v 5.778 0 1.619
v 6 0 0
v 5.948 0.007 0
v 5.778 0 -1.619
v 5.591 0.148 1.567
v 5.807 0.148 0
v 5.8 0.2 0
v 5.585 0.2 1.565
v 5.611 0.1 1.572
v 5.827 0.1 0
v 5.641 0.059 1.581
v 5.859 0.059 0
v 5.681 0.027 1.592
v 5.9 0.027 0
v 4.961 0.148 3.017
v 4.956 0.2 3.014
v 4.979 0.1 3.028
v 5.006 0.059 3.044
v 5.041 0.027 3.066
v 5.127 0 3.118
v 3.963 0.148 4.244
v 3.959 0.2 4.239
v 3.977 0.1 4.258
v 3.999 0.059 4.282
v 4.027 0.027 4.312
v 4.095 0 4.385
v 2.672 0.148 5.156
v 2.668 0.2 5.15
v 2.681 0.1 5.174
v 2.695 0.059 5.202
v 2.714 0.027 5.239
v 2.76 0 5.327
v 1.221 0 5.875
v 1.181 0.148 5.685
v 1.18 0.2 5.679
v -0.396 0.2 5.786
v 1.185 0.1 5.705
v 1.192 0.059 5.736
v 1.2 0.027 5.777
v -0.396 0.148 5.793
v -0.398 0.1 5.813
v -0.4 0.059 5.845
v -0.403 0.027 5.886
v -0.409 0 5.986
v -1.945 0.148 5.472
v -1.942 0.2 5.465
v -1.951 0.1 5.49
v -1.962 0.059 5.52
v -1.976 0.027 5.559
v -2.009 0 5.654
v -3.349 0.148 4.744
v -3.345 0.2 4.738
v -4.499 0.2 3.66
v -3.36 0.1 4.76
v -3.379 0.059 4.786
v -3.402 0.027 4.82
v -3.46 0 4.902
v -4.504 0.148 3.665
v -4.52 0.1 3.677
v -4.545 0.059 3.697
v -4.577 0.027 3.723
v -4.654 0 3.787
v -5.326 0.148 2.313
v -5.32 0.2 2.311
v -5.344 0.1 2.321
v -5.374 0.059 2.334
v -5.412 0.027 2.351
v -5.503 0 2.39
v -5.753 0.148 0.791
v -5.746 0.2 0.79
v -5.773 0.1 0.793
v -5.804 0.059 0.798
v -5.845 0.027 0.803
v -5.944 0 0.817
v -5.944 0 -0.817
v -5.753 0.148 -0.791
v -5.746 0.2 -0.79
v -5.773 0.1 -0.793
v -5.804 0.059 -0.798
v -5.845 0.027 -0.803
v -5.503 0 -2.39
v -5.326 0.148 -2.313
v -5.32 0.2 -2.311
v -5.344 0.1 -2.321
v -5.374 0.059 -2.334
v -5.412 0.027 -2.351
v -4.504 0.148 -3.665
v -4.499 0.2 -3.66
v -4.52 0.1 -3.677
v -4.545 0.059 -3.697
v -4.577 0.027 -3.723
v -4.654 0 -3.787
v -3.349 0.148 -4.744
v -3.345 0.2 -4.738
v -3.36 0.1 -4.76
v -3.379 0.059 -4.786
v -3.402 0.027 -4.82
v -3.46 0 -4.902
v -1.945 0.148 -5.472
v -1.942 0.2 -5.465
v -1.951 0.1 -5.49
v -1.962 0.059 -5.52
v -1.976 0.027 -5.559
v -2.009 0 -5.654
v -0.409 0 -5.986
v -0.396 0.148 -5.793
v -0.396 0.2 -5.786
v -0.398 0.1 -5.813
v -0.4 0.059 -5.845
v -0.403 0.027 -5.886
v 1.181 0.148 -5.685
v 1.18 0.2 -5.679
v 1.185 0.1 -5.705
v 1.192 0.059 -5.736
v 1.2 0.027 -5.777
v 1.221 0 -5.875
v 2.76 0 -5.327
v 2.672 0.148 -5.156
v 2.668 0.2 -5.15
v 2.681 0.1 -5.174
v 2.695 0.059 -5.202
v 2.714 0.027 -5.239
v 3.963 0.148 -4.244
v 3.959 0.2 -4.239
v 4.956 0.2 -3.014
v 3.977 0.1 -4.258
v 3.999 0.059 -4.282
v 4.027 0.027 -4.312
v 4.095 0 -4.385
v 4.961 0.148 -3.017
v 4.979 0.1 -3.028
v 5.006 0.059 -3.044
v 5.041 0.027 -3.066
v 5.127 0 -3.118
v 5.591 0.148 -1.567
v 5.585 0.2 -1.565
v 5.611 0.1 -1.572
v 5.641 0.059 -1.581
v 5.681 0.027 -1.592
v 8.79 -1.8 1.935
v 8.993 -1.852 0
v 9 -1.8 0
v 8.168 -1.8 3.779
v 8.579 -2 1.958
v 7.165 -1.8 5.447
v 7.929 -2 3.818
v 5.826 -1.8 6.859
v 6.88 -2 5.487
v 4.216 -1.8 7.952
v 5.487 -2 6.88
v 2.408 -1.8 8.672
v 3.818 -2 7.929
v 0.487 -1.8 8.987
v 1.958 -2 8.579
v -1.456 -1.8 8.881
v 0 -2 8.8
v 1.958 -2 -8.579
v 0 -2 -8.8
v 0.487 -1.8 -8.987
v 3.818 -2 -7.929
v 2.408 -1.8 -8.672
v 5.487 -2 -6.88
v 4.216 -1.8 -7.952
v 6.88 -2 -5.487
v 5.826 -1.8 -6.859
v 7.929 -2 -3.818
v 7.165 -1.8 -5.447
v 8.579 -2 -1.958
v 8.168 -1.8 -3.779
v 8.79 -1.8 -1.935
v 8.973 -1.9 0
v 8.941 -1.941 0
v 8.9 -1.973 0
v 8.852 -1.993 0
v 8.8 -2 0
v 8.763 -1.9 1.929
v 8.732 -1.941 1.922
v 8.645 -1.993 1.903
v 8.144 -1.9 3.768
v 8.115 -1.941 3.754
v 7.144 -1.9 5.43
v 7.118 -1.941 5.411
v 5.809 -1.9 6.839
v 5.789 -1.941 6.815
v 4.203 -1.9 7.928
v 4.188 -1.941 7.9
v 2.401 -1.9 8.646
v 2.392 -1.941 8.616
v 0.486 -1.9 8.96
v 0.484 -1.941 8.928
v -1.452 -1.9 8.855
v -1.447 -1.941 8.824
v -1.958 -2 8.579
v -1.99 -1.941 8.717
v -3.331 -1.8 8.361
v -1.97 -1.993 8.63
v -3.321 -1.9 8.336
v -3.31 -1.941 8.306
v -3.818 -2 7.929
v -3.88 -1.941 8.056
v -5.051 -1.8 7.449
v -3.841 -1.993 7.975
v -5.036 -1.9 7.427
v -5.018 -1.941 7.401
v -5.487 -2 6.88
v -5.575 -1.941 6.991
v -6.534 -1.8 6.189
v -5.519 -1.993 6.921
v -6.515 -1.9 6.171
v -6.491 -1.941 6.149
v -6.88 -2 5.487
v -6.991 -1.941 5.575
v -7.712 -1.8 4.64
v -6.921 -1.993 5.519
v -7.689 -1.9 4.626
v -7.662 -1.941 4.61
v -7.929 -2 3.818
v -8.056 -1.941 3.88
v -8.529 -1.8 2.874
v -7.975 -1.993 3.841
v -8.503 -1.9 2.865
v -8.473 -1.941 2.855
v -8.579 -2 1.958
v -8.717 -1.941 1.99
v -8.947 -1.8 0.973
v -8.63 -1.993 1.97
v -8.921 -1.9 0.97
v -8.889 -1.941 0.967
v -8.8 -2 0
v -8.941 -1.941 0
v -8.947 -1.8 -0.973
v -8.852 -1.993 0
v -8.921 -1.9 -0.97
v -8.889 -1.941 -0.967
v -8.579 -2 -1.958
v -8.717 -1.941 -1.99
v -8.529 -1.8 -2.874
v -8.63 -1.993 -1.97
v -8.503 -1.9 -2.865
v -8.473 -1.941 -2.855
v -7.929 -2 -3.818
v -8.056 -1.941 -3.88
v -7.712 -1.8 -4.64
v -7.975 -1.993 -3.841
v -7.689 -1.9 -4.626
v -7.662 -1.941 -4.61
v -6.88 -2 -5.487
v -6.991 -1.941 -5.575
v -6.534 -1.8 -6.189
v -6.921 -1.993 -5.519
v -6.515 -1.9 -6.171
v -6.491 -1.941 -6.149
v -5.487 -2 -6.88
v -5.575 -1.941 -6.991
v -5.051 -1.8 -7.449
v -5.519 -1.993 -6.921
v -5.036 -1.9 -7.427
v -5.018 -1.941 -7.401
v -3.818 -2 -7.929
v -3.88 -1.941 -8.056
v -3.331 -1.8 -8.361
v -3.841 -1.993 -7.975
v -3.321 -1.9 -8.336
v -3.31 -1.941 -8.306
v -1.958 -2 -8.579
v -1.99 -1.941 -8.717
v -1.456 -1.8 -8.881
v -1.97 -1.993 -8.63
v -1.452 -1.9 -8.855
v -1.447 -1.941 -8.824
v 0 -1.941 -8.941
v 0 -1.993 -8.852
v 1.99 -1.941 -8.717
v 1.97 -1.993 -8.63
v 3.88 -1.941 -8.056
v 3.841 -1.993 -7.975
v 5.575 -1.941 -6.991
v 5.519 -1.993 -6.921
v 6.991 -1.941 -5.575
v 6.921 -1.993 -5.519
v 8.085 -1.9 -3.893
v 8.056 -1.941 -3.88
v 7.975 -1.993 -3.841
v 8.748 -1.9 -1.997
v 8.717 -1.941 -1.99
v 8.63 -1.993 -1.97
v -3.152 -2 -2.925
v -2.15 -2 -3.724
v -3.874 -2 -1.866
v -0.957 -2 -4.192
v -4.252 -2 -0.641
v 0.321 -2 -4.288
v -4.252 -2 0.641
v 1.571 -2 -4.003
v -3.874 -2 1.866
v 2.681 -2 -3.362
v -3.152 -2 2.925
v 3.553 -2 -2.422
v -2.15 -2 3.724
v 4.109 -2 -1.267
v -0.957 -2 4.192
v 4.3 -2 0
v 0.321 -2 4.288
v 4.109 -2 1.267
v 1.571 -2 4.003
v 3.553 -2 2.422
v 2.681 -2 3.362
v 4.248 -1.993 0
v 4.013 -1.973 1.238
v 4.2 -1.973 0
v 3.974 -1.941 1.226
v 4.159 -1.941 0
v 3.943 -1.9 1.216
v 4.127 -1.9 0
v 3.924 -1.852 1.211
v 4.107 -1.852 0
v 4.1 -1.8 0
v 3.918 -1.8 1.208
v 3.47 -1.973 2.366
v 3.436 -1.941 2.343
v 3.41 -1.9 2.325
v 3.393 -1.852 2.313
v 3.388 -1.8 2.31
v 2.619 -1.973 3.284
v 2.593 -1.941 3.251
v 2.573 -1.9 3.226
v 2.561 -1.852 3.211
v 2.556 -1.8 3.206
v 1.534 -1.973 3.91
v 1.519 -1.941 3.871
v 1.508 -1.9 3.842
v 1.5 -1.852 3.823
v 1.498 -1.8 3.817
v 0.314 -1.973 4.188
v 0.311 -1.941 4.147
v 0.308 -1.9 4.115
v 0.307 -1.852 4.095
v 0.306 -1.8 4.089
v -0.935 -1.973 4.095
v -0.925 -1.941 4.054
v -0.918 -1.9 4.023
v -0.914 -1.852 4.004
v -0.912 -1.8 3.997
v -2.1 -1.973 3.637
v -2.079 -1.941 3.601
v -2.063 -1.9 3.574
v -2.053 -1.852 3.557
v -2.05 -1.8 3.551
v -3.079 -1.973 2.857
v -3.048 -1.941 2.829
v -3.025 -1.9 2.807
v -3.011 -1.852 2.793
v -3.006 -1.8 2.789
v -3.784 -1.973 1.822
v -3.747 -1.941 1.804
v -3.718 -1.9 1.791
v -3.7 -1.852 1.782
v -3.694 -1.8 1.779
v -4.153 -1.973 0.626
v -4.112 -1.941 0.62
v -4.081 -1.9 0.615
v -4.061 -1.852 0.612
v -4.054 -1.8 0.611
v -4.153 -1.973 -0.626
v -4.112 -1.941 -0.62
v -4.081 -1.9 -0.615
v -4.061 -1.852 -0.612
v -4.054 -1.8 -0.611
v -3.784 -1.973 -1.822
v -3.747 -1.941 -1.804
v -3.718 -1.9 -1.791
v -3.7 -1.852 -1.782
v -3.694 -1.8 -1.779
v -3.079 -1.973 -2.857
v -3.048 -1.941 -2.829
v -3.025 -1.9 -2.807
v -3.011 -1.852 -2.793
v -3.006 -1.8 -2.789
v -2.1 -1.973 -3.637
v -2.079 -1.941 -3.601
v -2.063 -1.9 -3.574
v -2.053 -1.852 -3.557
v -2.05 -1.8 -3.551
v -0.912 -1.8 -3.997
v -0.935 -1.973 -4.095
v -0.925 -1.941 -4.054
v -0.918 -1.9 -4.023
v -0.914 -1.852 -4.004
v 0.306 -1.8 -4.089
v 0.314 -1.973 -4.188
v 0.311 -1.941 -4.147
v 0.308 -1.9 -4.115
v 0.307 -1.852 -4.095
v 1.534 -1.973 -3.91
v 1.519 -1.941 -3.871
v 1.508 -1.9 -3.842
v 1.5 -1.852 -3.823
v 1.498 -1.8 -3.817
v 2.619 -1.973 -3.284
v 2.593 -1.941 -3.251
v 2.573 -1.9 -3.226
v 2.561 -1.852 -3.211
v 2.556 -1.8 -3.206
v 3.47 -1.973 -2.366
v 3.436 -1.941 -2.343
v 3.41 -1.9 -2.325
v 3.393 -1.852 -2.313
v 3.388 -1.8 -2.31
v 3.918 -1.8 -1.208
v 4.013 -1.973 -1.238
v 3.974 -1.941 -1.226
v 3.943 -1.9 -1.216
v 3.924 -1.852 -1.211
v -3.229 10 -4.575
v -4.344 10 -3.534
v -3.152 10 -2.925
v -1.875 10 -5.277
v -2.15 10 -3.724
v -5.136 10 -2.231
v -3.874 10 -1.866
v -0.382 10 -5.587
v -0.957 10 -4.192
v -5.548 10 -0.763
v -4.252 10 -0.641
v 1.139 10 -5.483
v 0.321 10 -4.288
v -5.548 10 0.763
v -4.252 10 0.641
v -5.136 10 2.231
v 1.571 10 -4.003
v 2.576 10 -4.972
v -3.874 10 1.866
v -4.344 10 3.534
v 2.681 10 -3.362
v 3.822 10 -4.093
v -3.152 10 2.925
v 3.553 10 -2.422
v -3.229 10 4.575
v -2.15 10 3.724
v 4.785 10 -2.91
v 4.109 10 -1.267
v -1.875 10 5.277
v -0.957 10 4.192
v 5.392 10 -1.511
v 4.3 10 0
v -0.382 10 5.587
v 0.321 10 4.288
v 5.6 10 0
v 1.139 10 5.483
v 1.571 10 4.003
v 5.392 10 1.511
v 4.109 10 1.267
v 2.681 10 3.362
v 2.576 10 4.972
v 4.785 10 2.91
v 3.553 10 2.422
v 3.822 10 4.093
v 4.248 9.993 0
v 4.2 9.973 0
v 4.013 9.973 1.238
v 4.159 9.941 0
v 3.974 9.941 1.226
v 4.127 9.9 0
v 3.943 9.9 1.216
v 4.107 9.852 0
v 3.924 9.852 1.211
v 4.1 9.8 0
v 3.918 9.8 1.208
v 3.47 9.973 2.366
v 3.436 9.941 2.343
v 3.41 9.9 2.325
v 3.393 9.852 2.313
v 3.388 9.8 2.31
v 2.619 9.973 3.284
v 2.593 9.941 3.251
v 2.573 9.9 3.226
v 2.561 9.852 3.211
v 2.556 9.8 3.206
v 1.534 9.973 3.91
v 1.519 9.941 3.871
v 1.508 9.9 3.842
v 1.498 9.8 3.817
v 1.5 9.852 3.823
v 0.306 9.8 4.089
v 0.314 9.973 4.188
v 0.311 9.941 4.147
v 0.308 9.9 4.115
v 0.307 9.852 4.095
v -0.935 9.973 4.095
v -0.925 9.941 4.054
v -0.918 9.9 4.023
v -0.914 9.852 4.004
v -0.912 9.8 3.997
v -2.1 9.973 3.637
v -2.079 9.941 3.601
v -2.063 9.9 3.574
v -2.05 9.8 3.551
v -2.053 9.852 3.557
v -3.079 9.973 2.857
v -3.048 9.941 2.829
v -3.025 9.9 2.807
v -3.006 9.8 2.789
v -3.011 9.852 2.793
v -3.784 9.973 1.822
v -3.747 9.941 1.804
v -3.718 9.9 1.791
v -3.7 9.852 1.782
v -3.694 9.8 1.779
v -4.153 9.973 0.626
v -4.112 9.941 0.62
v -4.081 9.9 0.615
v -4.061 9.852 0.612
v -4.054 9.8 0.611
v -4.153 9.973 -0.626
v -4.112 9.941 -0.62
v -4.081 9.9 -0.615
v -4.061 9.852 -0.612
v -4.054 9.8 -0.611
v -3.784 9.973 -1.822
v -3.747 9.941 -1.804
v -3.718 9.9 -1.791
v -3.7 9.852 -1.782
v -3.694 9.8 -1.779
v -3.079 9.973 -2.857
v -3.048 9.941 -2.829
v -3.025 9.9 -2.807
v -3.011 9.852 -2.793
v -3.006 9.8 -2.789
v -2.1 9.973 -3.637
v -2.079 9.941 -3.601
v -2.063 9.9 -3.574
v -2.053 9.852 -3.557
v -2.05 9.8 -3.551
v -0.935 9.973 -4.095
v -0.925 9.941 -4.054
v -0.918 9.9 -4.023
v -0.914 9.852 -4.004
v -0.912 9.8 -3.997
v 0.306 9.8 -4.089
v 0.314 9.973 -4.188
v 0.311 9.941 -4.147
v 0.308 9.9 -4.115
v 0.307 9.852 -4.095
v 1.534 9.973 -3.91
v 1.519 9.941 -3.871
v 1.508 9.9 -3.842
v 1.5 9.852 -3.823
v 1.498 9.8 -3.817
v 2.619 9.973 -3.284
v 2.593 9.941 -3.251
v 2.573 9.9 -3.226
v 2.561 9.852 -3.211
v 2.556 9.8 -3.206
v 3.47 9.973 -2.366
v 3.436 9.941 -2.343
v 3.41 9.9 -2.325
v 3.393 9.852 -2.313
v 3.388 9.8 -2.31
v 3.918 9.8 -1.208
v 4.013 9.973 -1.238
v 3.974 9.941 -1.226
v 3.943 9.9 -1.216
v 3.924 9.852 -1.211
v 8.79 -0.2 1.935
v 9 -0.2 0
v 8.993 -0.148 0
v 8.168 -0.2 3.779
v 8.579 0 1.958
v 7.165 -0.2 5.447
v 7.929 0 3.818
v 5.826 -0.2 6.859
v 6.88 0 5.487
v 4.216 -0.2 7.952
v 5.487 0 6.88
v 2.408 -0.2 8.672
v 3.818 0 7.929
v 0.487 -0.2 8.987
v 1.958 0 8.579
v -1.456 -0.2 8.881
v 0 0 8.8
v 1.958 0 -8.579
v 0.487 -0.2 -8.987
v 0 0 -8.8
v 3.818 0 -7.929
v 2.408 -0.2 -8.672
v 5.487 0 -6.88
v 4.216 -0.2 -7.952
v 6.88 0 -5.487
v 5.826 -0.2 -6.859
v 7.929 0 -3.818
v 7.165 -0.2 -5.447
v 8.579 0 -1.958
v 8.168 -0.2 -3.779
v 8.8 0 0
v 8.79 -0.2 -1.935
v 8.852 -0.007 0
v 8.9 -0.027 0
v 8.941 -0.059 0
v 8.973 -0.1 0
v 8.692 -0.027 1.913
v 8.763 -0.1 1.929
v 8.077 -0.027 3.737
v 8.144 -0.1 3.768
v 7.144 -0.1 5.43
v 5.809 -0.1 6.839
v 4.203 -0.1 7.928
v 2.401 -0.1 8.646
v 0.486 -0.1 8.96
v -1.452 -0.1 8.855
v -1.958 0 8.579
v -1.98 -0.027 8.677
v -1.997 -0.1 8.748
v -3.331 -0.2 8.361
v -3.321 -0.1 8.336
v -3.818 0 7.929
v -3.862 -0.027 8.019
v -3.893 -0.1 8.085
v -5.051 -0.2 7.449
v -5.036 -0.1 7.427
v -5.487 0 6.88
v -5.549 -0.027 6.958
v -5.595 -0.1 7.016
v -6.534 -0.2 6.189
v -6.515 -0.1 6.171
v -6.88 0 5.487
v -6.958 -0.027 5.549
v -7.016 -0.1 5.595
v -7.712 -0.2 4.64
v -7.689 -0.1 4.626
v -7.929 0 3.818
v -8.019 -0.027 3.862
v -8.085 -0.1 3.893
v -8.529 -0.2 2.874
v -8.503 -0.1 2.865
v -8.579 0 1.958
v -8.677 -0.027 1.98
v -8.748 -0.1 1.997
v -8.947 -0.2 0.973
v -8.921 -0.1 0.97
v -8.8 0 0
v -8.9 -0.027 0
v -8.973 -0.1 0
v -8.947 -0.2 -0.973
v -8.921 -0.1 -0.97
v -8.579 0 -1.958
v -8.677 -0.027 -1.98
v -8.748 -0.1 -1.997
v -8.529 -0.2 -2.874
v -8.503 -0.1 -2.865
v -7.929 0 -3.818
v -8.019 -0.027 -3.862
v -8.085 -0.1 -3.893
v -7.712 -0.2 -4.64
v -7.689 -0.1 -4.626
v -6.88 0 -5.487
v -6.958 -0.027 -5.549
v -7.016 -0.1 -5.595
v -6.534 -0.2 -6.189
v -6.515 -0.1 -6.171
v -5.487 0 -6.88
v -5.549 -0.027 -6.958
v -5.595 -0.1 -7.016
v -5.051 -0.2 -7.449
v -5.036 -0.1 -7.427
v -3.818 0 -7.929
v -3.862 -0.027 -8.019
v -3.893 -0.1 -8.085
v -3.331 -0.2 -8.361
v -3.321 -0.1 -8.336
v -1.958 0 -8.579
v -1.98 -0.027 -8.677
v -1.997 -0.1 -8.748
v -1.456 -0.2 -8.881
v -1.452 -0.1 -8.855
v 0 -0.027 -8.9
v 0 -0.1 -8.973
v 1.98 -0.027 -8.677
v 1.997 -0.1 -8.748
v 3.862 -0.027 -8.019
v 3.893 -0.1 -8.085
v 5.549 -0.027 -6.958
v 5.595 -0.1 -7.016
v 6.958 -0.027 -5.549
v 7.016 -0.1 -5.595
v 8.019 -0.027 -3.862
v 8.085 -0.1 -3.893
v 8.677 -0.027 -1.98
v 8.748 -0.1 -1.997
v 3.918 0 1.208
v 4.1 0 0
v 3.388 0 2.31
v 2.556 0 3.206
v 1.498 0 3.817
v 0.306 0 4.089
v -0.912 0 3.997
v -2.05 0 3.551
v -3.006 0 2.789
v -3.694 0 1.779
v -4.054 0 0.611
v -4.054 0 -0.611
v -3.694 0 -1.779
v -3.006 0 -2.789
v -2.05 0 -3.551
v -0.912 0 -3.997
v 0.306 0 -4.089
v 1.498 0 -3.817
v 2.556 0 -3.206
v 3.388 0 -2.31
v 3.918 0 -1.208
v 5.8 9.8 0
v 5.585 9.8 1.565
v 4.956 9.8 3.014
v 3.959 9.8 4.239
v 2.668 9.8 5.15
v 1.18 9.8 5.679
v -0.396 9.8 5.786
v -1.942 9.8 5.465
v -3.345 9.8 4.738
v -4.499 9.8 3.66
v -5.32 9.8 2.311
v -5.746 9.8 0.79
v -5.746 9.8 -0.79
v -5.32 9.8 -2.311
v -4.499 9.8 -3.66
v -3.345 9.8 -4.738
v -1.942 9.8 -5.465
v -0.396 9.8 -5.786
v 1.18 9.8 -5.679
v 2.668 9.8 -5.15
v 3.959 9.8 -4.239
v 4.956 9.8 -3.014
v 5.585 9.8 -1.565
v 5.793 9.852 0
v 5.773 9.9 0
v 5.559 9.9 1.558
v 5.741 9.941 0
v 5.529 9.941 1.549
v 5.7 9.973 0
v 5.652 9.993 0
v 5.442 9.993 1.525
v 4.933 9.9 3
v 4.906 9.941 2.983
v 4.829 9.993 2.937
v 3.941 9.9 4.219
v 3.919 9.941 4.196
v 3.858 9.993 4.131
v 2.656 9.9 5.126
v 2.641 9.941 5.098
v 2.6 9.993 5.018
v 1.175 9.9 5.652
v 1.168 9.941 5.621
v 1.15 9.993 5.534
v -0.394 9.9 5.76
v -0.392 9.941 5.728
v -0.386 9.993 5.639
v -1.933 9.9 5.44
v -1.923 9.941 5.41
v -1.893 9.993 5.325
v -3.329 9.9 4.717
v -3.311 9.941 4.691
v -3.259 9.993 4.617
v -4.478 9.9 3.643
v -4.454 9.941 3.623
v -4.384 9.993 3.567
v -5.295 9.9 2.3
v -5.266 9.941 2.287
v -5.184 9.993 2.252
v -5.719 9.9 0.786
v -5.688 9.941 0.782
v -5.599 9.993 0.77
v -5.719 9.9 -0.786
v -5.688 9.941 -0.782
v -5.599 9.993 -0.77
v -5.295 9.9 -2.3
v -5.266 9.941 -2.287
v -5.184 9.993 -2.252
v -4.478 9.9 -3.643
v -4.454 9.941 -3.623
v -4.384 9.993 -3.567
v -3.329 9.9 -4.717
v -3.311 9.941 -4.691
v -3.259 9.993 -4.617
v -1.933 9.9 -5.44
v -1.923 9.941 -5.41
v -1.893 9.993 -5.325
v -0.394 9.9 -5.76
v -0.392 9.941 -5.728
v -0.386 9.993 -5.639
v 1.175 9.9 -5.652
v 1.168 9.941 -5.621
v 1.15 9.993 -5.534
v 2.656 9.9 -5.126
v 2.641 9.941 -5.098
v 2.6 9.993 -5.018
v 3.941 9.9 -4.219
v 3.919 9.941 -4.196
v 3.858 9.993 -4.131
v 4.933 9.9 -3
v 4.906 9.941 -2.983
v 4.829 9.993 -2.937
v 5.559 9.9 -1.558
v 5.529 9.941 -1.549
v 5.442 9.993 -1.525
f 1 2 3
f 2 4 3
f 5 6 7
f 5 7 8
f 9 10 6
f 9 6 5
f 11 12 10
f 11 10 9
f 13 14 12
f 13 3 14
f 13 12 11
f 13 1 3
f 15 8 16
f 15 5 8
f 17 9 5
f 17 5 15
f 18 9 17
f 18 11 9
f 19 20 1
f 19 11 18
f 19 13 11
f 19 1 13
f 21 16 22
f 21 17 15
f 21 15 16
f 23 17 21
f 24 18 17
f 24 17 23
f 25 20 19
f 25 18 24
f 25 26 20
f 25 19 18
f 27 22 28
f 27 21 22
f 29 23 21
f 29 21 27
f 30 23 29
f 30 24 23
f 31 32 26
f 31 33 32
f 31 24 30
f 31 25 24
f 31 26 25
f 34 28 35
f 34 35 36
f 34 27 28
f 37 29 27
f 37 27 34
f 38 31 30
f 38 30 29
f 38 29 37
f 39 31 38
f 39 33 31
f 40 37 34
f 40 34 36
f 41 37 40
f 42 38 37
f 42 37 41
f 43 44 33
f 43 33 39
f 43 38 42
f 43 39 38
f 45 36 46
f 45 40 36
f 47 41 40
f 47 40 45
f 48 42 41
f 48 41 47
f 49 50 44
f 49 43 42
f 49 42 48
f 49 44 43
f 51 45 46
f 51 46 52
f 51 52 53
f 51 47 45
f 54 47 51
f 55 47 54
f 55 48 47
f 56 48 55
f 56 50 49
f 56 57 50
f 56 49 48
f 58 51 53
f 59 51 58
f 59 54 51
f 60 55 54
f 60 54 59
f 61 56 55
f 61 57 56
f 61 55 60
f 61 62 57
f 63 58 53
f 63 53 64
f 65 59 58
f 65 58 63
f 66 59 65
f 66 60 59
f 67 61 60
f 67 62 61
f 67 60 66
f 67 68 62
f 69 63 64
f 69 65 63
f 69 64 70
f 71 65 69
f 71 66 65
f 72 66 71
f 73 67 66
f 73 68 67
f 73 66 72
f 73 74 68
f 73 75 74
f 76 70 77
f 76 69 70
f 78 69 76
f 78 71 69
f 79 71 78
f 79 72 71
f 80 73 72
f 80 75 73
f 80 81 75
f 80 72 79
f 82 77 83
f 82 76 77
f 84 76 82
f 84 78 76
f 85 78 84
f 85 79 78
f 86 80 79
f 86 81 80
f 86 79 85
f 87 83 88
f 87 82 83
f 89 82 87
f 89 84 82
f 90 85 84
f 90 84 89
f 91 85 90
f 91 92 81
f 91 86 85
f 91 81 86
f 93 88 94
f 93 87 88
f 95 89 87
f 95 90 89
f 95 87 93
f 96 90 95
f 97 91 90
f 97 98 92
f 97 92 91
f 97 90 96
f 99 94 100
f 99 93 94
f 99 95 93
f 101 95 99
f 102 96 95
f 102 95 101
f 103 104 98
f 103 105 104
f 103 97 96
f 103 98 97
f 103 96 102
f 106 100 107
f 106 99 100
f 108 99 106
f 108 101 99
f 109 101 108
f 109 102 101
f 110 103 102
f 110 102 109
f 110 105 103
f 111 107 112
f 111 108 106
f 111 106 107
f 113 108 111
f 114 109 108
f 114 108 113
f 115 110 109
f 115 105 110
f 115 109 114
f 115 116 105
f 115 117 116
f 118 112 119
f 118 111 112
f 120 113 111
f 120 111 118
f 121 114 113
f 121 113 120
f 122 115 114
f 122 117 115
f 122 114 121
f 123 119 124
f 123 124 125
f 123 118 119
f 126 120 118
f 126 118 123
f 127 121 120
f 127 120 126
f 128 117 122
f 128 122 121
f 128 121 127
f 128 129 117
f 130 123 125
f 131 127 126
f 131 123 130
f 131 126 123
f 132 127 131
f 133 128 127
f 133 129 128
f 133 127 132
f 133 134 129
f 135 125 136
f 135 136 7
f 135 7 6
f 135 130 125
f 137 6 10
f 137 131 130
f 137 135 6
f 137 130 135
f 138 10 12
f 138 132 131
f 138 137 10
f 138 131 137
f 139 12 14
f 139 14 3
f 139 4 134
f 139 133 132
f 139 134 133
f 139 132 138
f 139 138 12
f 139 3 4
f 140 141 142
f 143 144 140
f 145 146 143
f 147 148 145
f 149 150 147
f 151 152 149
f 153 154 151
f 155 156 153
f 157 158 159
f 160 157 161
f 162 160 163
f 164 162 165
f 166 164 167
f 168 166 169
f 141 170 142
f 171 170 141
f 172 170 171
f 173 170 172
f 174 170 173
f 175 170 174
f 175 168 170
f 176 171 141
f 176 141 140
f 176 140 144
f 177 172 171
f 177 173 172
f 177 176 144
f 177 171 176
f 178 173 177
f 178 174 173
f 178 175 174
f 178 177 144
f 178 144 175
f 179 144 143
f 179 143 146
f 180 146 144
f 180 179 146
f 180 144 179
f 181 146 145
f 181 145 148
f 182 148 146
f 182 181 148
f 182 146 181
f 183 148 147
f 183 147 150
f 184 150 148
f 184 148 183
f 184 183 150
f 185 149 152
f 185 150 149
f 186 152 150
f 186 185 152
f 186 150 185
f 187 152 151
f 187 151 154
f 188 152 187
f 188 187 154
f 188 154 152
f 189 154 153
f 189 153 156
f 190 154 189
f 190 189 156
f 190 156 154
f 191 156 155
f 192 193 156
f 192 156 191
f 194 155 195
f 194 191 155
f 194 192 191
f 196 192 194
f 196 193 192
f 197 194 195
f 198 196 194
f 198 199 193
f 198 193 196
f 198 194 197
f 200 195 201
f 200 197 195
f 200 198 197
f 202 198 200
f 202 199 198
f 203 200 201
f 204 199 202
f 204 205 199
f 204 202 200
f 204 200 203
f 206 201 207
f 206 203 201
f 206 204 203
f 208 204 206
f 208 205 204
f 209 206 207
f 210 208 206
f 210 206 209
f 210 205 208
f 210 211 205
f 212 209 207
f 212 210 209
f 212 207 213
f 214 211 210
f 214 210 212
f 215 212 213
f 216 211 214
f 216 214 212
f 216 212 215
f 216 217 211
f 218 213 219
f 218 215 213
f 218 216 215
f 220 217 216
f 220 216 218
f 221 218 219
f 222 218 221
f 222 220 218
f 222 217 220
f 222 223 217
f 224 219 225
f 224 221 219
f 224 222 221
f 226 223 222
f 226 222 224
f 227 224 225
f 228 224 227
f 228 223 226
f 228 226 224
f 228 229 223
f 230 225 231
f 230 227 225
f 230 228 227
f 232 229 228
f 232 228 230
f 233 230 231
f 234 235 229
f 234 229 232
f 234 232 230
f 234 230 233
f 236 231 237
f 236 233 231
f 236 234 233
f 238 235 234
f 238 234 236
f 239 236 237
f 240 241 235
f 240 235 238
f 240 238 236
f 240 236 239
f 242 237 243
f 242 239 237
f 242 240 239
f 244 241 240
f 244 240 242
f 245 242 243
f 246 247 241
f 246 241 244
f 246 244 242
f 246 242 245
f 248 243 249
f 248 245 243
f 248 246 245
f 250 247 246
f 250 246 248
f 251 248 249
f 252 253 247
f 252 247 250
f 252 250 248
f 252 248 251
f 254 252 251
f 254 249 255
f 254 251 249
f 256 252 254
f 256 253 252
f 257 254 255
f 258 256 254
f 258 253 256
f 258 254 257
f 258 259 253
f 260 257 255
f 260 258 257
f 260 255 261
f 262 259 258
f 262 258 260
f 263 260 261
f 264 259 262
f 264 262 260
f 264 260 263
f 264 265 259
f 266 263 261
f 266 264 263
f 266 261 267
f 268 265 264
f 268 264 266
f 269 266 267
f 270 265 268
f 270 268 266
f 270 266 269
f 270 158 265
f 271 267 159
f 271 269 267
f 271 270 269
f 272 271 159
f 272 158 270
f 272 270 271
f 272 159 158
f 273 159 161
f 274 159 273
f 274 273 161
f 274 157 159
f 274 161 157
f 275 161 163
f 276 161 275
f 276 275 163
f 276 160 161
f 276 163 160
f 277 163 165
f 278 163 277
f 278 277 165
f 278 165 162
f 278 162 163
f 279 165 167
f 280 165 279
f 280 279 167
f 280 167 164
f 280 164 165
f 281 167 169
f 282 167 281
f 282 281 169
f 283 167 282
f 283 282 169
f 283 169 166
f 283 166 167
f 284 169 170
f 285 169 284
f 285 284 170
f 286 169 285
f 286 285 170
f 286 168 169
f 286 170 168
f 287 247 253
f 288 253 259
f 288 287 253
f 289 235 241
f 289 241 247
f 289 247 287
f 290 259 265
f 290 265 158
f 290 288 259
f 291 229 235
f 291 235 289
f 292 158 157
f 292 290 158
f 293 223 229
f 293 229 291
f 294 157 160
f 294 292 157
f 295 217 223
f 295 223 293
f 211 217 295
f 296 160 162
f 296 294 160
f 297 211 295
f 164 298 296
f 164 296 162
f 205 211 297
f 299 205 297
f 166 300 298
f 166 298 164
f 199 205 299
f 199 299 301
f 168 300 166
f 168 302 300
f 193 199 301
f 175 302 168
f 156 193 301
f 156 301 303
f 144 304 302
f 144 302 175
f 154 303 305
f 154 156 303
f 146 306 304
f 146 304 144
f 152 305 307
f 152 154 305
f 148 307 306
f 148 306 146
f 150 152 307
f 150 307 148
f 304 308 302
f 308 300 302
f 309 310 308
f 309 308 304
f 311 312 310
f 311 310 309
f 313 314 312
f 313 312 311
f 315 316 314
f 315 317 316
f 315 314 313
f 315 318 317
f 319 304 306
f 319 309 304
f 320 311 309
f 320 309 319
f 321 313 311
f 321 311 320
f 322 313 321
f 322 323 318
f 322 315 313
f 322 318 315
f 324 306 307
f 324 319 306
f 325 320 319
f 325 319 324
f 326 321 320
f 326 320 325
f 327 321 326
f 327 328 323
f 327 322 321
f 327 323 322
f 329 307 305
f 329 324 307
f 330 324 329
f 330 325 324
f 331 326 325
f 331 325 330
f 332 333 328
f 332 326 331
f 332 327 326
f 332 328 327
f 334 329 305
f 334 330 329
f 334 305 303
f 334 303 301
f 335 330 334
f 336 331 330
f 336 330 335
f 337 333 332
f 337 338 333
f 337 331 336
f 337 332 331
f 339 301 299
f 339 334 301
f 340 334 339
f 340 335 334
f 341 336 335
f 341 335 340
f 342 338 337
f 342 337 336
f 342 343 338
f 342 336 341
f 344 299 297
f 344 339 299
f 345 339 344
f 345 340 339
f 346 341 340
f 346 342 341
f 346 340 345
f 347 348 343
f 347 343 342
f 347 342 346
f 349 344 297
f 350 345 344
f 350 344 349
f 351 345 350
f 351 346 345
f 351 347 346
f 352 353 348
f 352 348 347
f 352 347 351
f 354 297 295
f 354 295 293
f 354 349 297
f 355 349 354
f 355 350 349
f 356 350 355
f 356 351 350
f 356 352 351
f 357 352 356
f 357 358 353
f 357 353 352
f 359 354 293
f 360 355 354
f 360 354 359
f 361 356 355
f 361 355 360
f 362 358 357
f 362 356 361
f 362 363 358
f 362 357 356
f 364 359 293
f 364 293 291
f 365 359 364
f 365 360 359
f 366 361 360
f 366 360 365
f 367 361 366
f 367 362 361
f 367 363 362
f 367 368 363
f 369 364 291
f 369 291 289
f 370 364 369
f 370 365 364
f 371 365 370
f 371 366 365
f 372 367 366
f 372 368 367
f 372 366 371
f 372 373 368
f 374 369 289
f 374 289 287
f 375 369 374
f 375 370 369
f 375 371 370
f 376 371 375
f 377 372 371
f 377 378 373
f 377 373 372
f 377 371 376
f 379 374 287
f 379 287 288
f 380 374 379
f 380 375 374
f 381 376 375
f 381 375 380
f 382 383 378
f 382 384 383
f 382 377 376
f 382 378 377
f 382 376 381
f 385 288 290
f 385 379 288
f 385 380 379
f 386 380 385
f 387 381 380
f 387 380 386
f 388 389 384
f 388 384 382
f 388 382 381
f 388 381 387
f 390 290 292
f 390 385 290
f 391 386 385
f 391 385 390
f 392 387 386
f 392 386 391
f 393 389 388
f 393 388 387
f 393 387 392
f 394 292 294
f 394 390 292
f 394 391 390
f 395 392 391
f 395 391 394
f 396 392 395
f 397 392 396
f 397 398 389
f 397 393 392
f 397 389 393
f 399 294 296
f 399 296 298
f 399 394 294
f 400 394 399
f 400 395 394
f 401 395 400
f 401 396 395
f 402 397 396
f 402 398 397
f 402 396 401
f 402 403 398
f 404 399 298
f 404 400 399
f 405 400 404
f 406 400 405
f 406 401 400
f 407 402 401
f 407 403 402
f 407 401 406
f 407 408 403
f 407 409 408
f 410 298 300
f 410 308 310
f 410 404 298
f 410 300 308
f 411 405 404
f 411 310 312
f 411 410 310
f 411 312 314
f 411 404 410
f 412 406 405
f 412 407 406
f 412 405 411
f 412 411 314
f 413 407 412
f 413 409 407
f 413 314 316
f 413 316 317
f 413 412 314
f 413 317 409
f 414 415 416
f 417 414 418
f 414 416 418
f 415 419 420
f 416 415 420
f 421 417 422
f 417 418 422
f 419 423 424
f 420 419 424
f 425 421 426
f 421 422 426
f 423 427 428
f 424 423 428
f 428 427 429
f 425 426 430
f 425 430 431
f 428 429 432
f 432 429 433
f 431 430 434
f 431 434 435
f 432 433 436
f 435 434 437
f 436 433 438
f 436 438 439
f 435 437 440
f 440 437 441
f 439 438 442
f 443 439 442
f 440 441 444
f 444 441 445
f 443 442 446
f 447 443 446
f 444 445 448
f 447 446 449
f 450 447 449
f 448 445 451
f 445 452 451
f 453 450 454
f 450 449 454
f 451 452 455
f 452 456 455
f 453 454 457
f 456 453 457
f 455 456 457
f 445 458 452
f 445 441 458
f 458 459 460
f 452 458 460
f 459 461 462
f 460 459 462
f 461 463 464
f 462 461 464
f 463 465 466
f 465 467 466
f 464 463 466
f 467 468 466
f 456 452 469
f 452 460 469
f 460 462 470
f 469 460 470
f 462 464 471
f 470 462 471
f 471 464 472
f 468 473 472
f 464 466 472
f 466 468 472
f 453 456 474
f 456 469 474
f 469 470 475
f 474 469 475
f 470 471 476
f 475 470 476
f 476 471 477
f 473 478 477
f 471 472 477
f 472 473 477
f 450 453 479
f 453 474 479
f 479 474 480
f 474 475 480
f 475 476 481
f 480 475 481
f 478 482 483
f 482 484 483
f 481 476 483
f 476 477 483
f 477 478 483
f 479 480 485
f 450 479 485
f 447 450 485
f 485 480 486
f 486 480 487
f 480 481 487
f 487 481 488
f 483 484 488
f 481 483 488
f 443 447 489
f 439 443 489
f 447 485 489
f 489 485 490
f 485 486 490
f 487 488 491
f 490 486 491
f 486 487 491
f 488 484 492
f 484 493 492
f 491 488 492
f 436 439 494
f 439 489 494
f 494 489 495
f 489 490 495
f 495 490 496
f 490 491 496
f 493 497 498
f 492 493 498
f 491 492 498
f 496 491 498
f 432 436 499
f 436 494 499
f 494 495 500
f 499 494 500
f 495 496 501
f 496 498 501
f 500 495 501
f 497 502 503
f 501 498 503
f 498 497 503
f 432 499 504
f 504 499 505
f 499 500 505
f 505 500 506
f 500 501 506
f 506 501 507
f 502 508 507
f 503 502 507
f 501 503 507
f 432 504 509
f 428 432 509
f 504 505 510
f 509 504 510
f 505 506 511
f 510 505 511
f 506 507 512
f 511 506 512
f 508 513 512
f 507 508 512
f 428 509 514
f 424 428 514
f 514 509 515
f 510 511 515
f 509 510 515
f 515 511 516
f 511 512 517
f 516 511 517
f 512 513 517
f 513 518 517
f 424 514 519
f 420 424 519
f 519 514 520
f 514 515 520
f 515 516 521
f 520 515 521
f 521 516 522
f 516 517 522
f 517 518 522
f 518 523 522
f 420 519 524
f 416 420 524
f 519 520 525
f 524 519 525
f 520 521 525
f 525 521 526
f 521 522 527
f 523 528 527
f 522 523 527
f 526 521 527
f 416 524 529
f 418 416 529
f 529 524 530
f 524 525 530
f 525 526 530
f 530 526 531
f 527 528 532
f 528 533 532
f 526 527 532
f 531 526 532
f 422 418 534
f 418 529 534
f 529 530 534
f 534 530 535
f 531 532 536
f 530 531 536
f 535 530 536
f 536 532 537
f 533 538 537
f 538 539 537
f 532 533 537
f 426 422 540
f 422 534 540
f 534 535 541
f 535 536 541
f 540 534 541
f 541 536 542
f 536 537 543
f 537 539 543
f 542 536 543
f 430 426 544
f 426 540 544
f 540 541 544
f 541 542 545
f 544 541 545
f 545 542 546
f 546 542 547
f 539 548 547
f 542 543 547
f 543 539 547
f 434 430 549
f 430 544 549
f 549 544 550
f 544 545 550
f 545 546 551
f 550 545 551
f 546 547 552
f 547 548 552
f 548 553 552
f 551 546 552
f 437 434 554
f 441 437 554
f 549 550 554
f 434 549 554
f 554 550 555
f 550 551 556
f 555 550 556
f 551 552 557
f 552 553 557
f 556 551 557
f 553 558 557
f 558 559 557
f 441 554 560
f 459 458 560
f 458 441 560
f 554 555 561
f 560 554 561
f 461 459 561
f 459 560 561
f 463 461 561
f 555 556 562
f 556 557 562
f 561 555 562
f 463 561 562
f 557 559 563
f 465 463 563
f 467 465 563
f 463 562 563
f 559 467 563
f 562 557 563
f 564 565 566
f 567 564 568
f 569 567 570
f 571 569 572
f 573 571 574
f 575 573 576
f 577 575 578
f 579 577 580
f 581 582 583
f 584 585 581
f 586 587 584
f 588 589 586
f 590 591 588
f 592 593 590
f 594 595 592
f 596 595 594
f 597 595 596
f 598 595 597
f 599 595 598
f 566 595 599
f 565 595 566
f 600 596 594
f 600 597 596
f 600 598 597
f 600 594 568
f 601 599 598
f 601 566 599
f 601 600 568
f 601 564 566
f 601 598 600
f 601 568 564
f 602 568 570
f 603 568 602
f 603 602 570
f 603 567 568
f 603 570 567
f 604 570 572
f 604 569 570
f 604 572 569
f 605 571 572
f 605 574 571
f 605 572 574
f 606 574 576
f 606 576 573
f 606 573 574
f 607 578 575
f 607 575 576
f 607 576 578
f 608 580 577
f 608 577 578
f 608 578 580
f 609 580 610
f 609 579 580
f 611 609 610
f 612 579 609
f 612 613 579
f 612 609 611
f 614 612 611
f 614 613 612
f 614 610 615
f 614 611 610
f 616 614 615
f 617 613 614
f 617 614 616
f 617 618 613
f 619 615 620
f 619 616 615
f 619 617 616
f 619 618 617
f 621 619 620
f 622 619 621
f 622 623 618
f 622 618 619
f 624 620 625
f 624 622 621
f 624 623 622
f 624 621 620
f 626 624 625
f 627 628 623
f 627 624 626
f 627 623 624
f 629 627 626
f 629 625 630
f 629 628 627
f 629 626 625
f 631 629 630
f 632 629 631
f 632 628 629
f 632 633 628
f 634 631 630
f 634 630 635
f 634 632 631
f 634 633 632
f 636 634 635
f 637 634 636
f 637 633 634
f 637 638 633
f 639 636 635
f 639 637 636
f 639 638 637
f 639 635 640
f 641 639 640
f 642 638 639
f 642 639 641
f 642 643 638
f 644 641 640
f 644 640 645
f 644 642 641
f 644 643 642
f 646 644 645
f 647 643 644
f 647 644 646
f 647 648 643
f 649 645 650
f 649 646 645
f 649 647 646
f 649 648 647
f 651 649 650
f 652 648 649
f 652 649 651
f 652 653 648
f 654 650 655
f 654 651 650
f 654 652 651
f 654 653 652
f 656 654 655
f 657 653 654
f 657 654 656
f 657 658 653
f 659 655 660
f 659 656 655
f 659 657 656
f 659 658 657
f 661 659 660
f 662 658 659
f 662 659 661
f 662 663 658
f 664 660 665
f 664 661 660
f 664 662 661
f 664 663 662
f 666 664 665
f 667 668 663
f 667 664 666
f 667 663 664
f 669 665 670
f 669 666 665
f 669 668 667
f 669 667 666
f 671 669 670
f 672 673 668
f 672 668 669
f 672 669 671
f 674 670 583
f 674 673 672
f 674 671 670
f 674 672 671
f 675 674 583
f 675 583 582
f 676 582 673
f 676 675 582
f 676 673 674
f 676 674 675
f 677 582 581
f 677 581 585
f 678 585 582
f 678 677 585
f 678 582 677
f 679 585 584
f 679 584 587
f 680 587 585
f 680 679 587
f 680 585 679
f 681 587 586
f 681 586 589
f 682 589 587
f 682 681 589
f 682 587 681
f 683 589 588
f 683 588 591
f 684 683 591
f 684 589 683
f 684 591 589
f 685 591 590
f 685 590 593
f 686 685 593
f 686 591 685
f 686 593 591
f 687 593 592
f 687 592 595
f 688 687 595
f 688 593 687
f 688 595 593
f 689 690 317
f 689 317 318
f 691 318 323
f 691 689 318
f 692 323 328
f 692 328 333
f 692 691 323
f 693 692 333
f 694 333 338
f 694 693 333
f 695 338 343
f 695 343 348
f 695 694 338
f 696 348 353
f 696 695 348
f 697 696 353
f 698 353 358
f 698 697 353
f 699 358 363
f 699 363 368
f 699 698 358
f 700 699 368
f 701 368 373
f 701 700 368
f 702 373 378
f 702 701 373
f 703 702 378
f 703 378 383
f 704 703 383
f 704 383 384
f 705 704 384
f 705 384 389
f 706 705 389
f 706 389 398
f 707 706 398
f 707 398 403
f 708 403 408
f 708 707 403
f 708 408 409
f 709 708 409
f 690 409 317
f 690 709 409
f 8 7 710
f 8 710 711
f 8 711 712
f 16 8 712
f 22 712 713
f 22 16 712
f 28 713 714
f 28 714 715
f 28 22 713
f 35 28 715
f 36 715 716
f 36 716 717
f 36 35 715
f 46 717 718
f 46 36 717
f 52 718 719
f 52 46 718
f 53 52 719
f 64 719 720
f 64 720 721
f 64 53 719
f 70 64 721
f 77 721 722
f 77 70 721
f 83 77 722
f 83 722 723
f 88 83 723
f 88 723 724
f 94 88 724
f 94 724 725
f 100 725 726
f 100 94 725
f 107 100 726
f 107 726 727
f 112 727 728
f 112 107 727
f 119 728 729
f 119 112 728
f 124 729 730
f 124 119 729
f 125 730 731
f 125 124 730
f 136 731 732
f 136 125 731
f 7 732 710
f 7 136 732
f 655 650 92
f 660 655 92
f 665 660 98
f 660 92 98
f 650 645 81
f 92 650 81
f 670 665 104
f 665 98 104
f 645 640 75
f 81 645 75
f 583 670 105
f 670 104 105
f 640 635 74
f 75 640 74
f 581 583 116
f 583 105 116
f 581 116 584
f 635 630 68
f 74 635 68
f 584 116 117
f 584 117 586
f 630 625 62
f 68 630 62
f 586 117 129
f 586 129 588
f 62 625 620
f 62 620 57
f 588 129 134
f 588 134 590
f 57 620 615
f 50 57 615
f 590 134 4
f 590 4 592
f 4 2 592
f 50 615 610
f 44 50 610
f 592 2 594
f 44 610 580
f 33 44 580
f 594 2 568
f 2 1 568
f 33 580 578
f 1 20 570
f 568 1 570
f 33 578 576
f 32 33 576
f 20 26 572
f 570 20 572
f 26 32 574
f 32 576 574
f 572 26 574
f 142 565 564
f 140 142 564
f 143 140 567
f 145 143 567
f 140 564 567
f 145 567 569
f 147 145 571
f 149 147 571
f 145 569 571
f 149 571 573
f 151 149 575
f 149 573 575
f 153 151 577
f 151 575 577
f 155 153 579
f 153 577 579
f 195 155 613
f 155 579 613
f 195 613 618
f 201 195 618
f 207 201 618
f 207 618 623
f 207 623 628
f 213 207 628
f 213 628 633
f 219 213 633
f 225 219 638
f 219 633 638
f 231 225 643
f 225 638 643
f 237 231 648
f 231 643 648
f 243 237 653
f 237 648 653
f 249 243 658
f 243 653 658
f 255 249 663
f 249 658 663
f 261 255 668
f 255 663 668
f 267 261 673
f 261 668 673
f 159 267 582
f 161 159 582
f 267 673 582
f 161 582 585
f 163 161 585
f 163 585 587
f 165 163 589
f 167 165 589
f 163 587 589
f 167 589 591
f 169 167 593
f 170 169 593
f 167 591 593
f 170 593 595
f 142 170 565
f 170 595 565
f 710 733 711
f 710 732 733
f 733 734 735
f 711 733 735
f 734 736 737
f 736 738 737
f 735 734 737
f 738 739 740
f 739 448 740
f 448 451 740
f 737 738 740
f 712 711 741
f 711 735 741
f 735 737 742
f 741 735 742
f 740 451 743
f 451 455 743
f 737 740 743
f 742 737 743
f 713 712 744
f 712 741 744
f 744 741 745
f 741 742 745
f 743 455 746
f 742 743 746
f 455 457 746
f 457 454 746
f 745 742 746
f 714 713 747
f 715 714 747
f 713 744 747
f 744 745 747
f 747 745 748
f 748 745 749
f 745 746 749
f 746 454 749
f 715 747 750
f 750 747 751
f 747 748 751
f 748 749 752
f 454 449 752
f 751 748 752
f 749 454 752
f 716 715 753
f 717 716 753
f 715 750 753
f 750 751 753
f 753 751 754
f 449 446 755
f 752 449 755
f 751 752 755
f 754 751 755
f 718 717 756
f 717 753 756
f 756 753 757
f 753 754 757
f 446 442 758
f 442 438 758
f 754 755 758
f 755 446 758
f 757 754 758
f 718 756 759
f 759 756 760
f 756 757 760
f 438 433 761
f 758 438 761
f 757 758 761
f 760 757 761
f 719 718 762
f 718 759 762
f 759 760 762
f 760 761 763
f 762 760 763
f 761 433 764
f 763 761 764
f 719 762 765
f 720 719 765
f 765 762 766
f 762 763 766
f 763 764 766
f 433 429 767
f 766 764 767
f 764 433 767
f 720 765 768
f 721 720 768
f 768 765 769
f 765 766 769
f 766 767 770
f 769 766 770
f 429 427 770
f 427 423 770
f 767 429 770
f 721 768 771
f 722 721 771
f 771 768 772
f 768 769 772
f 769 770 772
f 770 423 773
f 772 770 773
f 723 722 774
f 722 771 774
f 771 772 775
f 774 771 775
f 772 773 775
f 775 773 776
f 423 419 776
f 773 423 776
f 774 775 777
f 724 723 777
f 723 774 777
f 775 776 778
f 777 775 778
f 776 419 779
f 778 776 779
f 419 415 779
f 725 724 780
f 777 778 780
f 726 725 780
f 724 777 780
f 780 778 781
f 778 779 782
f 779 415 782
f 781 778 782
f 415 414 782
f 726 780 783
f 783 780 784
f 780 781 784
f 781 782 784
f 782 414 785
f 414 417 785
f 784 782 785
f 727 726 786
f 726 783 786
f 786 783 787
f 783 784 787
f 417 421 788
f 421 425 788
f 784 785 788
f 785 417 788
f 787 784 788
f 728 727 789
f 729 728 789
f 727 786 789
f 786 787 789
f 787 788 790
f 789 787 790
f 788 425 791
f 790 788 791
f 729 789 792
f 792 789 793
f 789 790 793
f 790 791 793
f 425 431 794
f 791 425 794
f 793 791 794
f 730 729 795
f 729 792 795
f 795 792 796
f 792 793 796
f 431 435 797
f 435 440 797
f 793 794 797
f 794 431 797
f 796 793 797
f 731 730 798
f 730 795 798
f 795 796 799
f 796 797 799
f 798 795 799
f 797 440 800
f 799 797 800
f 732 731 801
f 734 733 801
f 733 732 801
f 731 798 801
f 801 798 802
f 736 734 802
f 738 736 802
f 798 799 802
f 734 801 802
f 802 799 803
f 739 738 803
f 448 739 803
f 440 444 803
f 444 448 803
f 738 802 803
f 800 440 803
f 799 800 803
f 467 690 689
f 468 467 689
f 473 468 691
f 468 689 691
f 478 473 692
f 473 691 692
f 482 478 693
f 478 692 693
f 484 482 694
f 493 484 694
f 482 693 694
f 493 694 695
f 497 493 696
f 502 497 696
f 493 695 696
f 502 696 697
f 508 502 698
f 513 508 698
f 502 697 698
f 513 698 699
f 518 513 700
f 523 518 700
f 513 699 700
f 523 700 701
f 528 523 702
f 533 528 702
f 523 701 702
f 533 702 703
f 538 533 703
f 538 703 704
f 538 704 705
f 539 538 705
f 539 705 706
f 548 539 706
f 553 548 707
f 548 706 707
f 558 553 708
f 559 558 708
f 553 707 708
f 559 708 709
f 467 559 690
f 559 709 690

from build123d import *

# Parameters (mm, degrees)
F0_R     = 9
F0_R_2   = 5.8
F0_R_3   = 4.1
F1_DEPTH = 2
F2_DEPTH = 10
F3_R     = 0.2


# Not quite as in the source:
# - a feature names something its author has since deleted; it is built from what else it names


with BuildPart() as f1:
    # F0 (on Front) → F1 (new body)
    with BuildSketch(Plane.XZ):
        Circle(F0_R)
        Circle(F0_R_2, mode=Mode.SUBTRACT)
        Circle(F0_R_2)
        Circle(F0_R_3, mode=Mode.SUBTRACT)
    extrude(amount=F1_DEPTH)

    # F0 (on Front) → F2 (join)
    with BuildSketch(Plane.XZ):
        Circle(F0_R_2)
        Circle(F0_R_3, mode=Mode.SUBTRACT)
    extrude(amount=-F2_DEPTH)

    # F3
    f3_edges = [f1.edges().sort_by_distance(p)[0] for p in [
        (-9, 0, 0),
        (-9, -2, 0),
        (5.8, 5, 0),
        (-5.8, 0, 0),
        (-5.8, 10, 0),
        (-4.1, 10, 0),
        (-4.1, -2, 0),
    ]]
    fillet(f3_edges, radius=F3_R)


solid = f1.part
